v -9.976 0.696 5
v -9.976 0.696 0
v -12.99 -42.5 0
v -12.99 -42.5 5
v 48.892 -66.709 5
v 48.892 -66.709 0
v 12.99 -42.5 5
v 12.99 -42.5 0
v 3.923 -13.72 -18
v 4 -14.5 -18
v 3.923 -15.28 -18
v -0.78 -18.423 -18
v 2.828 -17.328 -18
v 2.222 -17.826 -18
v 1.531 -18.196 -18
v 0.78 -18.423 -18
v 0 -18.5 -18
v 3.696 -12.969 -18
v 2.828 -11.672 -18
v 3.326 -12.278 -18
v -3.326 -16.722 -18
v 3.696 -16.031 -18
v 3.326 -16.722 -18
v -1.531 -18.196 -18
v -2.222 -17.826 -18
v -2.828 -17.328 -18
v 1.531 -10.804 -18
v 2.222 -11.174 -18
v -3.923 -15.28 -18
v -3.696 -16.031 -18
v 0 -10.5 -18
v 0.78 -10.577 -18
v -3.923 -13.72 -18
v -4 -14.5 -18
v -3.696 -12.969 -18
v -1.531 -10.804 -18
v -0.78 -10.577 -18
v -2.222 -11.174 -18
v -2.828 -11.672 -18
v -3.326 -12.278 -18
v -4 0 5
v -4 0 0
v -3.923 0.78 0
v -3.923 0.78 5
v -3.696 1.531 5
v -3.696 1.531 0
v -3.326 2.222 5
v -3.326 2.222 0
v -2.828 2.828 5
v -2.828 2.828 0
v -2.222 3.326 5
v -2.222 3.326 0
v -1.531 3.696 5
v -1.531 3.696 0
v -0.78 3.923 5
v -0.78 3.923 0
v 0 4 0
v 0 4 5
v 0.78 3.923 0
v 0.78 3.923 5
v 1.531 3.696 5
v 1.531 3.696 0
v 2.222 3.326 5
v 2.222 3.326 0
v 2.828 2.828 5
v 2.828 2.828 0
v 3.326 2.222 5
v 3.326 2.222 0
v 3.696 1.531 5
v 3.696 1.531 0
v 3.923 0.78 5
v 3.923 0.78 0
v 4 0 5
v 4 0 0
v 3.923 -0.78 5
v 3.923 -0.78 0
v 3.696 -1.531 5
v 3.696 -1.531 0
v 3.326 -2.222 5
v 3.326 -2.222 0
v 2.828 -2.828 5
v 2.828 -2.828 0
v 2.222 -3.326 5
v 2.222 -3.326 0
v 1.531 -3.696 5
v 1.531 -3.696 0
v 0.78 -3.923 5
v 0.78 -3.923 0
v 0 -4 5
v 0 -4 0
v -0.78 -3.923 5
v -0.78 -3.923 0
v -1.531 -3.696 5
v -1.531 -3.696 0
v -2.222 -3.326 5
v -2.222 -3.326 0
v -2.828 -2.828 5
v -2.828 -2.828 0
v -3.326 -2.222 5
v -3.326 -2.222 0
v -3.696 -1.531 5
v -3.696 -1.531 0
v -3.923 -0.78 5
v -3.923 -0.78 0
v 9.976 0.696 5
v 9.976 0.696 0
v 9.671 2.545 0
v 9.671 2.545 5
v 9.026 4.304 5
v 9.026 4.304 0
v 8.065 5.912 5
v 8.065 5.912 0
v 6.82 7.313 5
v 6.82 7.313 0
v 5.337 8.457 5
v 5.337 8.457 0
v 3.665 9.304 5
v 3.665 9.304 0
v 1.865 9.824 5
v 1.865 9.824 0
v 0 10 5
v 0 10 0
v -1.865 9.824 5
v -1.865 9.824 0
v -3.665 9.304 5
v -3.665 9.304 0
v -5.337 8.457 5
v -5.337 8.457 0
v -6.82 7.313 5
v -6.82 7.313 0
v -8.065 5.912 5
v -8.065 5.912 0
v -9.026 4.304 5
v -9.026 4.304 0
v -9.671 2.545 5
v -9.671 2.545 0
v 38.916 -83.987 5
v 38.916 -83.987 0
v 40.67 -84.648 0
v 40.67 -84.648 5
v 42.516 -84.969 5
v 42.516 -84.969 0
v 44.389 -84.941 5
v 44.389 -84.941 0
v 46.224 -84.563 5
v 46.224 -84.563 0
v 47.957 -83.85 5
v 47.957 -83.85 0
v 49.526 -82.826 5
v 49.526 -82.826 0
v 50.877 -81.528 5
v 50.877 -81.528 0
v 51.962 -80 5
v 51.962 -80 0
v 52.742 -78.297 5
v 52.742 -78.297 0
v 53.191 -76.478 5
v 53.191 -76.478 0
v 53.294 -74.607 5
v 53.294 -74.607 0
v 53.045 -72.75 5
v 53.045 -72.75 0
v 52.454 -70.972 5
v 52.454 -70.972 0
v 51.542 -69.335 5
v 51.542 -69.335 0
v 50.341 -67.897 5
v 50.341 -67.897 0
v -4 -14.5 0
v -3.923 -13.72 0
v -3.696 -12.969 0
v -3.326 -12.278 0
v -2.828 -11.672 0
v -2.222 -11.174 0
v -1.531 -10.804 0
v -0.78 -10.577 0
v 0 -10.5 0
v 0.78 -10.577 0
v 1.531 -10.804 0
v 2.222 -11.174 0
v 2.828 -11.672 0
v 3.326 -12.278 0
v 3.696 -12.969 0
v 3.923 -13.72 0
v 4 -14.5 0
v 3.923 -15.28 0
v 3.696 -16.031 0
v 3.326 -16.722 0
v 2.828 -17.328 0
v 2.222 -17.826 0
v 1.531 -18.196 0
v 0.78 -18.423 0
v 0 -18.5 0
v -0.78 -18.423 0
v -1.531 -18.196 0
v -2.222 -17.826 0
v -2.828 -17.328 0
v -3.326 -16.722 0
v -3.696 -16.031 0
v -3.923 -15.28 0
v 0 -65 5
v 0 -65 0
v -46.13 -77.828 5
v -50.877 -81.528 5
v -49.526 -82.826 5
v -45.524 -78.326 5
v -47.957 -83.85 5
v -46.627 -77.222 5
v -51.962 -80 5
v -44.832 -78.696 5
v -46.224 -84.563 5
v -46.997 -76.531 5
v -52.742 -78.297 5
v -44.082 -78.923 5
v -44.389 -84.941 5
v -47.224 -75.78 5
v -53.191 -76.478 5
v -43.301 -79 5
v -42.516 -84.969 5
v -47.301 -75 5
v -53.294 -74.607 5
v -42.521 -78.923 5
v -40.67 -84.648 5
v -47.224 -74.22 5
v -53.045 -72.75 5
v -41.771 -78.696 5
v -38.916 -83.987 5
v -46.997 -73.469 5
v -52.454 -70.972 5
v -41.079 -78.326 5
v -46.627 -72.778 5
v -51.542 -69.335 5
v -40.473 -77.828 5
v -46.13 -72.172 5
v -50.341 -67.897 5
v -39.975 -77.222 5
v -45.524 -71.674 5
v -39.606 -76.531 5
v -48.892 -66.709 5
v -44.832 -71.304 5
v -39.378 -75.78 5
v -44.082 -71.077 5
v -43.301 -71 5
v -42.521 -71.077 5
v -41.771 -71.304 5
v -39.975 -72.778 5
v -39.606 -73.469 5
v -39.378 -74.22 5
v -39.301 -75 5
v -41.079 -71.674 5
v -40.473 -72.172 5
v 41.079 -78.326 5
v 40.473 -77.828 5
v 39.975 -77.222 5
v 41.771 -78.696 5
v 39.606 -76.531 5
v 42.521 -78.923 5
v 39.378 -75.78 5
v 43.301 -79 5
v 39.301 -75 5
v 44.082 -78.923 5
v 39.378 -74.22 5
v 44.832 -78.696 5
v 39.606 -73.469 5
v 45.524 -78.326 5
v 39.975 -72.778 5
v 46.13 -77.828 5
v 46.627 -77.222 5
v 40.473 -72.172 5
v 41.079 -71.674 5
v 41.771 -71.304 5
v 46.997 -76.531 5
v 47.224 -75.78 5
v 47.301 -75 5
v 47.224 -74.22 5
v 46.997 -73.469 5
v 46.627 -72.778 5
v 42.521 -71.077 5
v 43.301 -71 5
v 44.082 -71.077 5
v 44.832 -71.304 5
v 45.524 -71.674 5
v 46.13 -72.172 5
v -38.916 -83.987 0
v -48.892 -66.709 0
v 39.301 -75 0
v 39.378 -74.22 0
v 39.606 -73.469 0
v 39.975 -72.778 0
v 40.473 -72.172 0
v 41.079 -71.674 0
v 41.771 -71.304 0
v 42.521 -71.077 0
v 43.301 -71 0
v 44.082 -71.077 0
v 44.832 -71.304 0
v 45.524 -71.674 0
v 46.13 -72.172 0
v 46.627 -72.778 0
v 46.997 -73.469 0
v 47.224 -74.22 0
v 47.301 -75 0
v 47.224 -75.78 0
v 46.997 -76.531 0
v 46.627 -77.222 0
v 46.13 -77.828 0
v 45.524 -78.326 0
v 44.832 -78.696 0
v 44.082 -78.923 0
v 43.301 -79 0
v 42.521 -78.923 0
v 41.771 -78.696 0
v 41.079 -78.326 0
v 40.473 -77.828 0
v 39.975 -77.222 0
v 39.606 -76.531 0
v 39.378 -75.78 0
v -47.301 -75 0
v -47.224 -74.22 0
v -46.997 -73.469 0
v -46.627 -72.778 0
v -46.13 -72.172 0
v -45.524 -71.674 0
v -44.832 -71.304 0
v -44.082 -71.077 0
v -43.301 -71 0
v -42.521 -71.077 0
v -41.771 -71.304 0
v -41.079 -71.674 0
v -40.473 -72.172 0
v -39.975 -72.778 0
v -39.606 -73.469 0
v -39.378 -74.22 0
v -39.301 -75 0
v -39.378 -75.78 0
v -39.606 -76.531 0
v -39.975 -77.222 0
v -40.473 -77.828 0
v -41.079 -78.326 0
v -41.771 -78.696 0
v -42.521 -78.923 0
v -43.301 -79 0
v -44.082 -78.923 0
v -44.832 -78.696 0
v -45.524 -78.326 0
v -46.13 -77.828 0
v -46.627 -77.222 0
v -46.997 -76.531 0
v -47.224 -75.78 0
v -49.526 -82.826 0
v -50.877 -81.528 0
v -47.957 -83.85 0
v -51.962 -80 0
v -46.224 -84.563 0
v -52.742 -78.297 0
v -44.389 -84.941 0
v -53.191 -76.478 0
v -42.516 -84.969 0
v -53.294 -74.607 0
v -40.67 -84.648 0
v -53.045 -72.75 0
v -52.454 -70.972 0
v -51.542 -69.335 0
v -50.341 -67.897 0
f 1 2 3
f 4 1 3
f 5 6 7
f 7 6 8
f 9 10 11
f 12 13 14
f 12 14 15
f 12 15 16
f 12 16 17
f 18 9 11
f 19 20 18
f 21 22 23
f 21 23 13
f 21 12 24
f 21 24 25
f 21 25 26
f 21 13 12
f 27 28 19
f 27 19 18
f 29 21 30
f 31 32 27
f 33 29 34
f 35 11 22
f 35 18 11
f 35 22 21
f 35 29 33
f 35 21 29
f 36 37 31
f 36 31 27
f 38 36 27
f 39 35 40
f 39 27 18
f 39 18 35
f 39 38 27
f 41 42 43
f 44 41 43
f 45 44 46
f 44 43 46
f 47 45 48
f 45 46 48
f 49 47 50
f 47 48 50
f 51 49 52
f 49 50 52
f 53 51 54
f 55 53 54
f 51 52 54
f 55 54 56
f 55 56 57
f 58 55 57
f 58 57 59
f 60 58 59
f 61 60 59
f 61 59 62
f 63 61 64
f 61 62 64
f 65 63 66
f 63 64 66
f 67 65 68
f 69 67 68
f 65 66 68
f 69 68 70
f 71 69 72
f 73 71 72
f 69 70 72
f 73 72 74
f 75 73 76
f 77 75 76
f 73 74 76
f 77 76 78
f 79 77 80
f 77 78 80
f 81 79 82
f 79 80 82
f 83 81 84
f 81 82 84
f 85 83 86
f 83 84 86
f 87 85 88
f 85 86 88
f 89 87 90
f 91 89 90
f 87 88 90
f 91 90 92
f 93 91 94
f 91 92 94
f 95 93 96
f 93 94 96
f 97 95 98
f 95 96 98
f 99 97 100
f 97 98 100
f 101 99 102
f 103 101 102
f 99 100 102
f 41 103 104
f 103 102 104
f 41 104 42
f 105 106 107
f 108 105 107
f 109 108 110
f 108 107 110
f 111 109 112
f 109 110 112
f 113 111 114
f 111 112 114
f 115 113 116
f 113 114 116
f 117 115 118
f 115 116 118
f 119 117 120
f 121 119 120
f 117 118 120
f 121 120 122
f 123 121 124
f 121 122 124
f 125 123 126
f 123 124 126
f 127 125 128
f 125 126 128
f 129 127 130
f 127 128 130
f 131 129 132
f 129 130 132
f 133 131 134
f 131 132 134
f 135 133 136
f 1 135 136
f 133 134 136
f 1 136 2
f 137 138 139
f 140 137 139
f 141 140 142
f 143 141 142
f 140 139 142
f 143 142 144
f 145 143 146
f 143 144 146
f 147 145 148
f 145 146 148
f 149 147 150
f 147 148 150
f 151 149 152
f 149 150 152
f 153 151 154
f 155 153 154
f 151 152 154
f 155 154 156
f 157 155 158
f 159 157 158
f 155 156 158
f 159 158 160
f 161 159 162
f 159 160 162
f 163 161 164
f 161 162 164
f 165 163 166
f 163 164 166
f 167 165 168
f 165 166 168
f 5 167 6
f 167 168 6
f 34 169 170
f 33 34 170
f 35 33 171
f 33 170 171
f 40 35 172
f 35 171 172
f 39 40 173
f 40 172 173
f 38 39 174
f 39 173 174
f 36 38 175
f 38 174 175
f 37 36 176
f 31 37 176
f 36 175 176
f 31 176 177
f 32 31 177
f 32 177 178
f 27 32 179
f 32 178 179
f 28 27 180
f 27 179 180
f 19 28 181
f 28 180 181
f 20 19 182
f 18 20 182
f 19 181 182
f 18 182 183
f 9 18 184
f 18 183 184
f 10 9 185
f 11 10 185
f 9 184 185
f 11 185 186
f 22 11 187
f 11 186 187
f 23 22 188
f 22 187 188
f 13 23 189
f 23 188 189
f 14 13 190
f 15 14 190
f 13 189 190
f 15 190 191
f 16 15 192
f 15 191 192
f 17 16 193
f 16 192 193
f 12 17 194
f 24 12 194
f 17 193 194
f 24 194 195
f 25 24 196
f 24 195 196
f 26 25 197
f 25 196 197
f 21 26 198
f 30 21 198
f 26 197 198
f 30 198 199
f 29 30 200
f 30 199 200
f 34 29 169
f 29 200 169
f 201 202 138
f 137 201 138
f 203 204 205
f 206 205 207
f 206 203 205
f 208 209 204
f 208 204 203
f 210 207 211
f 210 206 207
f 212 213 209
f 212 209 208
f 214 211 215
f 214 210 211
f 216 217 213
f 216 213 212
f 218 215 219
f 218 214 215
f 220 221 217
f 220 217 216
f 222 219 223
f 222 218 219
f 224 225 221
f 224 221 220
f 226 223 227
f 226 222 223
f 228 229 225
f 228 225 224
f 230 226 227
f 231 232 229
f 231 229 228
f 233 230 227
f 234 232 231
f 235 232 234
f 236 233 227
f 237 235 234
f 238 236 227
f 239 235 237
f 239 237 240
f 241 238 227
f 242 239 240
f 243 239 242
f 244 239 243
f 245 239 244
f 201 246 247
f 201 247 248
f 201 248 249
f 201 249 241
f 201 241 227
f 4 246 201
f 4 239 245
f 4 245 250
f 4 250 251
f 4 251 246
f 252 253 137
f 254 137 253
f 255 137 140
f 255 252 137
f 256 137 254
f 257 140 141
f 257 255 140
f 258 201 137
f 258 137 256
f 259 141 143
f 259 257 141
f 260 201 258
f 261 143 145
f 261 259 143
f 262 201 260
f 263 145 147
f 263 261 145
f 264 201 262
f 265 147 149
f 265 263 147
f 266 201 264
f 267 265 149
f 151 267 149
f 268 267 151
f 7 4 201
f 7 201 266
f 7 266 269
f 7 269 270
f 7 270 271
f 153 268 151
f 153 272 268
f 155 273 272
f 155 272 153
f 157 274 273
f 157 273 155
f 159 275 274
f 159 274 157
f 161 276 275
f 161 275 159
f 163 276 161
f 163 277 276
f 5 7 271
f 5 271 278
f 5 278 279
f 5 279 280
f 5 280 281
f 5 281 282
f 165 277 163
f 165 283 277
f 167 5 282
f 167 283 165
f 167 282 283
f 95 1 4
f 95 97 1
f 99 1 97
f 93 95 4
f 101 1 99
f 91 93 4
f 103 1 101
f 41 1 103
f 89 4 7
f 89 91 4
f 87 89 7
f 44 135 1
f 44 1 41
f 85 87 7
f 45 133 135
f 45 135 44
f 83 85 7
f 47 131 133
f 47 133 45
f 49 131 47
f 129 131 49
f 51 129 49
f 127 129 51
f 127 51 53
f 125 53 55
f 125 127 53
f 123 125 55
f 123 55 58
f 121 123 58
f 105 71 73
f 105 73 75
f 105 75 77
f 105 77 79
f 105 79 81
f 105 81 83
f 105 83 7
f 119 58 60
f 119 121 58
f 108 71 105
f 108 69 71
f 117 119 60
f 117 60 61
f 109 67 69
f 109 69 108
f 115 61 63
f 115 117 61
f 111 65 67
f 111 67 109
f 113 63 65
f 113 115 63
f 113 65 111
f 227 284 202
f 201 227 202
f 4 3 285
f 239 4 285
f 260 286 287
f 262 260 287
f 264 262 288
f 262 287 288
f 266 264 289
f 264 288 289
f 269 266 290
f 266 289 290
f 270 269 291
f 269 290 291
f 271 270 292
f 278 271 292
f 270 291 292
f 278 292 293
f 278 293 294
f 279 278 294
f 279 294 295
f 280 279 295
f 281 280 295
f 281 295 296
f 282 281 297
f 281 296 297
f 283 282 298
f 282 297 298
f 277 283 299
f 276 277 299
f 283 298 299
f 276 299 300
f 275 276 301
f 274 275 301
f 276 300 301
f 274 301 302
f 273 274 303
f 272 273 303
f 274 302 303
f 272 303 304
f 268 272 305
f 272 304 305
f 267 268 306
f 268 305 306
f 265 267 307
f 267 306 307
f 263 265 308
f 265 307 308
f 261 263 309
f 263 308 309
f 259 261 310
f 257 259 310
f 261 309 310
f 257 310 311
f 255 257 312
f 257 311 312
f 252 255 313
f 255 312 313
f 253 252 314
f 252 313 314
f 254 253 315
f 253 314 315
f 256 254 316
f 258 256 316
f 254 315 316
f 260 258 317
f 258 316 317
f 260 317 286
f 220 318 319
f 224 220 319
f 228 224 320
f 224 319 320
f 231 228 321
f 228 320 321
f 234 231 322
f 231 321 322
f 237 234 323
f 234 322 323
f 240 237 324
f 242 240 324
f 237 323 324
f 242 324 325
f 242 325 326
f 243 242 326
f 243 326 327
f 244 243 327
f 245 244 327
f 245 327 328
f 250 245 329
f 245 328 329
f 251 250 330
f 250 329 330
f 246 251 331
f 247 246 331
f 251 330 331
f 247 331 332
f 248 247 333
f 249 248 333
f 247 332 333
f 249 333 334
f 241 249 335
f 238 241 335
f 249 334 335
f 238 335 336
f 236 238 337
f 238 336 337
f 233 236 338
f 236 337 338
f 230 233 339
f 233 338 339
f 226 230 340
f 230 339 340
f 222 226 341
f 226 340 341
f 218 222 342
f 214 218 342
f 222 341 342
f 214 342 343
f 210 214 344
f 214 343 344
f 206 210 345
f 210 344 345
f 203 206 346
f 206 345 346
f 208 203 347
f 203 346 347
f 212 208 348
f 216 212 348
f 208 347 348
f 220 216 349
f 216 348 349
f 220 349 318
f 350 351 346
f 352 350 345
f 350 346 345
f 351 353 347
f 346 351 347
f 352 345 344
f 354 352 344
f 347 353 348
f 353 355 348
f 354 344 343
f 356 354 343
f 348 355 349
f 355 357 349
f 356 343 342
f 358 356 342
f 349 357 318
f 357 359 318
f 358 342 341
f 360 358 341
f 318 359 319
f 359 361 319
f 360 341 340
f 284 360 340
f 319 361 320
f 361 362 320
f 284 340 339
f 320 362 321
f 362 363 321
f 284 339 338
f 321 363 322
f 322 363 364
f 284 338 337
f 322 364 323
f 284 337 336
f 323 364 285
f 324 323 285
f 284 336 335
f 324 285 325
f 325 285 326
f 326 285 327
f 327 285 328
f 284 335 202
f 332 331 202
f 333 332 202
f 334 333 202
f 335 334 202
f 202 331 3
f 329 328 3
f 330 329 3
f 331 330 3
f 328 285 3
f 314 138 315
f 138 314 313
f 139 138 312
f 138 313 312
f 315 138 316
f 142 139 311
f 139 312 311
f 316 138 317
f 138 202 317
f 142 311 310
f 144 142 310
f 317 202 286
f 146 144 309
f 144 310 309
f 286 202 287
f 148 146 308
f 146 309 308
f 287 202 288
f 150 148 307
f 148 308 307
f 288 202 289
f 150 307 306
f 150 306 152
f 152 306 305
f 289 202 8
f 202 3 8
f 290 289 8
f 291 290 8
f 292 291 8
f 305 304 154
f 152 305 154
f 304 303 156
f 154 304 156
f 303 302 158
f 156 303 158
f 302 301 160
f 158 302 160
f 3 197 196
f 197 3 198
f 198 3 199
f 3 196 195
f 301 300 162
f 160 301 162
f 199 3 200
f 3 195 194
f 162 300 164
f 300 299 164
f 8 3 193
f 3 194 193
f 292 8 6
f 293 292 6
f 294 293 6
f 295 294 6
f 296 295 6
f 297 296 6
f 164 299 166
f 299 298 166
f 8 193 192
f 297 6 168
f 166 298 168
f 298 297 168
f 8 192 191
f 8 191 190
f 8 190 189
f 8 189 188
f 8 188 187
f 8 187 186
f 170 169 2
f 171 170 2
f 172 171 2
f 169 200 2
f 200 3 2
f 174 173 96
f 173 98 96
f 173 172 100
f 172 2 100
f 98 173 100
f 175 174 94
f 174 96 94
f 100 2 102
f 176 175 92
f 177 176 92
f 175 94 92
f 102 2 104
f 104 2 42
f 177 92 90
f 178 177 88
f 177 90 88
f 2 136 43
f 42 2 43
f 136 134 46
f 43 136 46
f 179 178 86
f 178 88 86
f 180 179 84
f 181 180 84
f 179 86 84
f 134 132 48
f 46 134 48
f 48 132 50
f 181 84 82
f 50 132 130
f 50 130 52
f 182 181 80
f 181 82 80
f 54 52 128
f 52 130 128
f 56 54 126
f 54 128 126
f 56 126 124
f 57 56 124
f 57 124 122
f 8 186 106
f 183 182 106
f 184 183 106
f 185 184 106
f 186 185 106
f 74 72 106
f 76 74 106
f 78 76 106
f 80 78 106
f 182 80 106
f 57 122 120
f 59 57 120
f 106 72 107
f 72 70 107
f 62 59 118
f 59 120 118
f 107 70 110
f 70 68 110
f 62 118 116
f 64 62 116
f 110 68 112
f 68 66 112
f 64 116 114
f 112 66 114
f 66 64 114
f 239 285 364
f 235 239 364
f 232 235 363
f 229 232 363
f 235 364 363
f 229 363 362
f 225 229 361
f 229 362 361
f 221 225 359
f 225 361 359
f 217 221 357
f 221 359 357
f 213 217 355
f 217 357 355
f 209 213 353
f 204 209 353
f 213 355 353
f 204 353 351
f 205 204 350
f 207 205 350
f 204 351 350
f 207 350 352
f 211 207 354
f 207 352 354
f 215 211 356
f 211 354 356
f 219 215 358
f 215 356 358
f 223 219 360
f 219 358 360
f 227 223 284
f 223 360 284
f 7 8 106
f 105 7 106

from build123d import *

# Parameters (mm, degrees)
BOSS_EXTRUDE1_DEPTH = 5
SKETCH3_R           = 4
CUT_EXTRUDE1_DEPTH  = 5
SKETCH4_R           = 4
PEG_DEPTH           = 18


with BuildPart() as part:
    # Sketch1 → Boss-Extrude1 (new body)
    with BuildSketch(Plane.XY):
        with BuildLine():
            Line((-38.916331436, -83.987341772), (0, -65))
            Line((0, -65), (38.916331436, -83.987341772))
            ThreePointArc((38.916331436, -83.987341772), (51.961524227, -80), (48.8920671, -66.708860759))
            Line((48.8920671, -66.708860759), (12.990381057, -42.5))
            Line((12.990381057, -42.5), (9.975735664, 0.696202532))
            ThreePointArc((9.975735664, 0.696202532), (0, 10), (-9.975735664, 0.696202532))
            Line((-9.975735664, 0.696202532), (-12.990381057, -42.5))
            Line((-12.990381057, -42.5), (-48.8920671, -66.708860759))
            ThreePointArc((-48.8920671, -66.708860759), (-51.961524227, -80), (-38.916331436, -83.987341772))
        make_face()
    extrude(amount=BOSS_EXTRUDE1_DEPTH)

    # Sketch3 → Cut-Extrude1 (cut)
    with BuildSketch(Plane(origin=(0, 0, 0), x_dir=(-1, 0, 0), z_dir=(0, 0, -1))):
        with Locations((0, 30)):
            Circle(SKETCH3_R)
        Circle(SKETCH3_R)
        with Locations((-43.301270189, -75)):
            Circle(SKETCH3_R)
        with Locations((43.301270189, -75)):
            Circle(SKETCH3_R)
    extrude(amount=-CUT_EXTRUDE1_DEPTH, mode=Mode.SUBTRACT)

    # Sketch4 → peg (add)
    with BuildSketch(Plane(origin=(0, 0, 0), x_dir=(-1, 0, 0), z_dir=(0, 0, -1))):
        with Locations((0, -14.5)):
            Circle(SKETCH4_R)
    extrude(amount=PEG_DEPTH)


solid = part.part
